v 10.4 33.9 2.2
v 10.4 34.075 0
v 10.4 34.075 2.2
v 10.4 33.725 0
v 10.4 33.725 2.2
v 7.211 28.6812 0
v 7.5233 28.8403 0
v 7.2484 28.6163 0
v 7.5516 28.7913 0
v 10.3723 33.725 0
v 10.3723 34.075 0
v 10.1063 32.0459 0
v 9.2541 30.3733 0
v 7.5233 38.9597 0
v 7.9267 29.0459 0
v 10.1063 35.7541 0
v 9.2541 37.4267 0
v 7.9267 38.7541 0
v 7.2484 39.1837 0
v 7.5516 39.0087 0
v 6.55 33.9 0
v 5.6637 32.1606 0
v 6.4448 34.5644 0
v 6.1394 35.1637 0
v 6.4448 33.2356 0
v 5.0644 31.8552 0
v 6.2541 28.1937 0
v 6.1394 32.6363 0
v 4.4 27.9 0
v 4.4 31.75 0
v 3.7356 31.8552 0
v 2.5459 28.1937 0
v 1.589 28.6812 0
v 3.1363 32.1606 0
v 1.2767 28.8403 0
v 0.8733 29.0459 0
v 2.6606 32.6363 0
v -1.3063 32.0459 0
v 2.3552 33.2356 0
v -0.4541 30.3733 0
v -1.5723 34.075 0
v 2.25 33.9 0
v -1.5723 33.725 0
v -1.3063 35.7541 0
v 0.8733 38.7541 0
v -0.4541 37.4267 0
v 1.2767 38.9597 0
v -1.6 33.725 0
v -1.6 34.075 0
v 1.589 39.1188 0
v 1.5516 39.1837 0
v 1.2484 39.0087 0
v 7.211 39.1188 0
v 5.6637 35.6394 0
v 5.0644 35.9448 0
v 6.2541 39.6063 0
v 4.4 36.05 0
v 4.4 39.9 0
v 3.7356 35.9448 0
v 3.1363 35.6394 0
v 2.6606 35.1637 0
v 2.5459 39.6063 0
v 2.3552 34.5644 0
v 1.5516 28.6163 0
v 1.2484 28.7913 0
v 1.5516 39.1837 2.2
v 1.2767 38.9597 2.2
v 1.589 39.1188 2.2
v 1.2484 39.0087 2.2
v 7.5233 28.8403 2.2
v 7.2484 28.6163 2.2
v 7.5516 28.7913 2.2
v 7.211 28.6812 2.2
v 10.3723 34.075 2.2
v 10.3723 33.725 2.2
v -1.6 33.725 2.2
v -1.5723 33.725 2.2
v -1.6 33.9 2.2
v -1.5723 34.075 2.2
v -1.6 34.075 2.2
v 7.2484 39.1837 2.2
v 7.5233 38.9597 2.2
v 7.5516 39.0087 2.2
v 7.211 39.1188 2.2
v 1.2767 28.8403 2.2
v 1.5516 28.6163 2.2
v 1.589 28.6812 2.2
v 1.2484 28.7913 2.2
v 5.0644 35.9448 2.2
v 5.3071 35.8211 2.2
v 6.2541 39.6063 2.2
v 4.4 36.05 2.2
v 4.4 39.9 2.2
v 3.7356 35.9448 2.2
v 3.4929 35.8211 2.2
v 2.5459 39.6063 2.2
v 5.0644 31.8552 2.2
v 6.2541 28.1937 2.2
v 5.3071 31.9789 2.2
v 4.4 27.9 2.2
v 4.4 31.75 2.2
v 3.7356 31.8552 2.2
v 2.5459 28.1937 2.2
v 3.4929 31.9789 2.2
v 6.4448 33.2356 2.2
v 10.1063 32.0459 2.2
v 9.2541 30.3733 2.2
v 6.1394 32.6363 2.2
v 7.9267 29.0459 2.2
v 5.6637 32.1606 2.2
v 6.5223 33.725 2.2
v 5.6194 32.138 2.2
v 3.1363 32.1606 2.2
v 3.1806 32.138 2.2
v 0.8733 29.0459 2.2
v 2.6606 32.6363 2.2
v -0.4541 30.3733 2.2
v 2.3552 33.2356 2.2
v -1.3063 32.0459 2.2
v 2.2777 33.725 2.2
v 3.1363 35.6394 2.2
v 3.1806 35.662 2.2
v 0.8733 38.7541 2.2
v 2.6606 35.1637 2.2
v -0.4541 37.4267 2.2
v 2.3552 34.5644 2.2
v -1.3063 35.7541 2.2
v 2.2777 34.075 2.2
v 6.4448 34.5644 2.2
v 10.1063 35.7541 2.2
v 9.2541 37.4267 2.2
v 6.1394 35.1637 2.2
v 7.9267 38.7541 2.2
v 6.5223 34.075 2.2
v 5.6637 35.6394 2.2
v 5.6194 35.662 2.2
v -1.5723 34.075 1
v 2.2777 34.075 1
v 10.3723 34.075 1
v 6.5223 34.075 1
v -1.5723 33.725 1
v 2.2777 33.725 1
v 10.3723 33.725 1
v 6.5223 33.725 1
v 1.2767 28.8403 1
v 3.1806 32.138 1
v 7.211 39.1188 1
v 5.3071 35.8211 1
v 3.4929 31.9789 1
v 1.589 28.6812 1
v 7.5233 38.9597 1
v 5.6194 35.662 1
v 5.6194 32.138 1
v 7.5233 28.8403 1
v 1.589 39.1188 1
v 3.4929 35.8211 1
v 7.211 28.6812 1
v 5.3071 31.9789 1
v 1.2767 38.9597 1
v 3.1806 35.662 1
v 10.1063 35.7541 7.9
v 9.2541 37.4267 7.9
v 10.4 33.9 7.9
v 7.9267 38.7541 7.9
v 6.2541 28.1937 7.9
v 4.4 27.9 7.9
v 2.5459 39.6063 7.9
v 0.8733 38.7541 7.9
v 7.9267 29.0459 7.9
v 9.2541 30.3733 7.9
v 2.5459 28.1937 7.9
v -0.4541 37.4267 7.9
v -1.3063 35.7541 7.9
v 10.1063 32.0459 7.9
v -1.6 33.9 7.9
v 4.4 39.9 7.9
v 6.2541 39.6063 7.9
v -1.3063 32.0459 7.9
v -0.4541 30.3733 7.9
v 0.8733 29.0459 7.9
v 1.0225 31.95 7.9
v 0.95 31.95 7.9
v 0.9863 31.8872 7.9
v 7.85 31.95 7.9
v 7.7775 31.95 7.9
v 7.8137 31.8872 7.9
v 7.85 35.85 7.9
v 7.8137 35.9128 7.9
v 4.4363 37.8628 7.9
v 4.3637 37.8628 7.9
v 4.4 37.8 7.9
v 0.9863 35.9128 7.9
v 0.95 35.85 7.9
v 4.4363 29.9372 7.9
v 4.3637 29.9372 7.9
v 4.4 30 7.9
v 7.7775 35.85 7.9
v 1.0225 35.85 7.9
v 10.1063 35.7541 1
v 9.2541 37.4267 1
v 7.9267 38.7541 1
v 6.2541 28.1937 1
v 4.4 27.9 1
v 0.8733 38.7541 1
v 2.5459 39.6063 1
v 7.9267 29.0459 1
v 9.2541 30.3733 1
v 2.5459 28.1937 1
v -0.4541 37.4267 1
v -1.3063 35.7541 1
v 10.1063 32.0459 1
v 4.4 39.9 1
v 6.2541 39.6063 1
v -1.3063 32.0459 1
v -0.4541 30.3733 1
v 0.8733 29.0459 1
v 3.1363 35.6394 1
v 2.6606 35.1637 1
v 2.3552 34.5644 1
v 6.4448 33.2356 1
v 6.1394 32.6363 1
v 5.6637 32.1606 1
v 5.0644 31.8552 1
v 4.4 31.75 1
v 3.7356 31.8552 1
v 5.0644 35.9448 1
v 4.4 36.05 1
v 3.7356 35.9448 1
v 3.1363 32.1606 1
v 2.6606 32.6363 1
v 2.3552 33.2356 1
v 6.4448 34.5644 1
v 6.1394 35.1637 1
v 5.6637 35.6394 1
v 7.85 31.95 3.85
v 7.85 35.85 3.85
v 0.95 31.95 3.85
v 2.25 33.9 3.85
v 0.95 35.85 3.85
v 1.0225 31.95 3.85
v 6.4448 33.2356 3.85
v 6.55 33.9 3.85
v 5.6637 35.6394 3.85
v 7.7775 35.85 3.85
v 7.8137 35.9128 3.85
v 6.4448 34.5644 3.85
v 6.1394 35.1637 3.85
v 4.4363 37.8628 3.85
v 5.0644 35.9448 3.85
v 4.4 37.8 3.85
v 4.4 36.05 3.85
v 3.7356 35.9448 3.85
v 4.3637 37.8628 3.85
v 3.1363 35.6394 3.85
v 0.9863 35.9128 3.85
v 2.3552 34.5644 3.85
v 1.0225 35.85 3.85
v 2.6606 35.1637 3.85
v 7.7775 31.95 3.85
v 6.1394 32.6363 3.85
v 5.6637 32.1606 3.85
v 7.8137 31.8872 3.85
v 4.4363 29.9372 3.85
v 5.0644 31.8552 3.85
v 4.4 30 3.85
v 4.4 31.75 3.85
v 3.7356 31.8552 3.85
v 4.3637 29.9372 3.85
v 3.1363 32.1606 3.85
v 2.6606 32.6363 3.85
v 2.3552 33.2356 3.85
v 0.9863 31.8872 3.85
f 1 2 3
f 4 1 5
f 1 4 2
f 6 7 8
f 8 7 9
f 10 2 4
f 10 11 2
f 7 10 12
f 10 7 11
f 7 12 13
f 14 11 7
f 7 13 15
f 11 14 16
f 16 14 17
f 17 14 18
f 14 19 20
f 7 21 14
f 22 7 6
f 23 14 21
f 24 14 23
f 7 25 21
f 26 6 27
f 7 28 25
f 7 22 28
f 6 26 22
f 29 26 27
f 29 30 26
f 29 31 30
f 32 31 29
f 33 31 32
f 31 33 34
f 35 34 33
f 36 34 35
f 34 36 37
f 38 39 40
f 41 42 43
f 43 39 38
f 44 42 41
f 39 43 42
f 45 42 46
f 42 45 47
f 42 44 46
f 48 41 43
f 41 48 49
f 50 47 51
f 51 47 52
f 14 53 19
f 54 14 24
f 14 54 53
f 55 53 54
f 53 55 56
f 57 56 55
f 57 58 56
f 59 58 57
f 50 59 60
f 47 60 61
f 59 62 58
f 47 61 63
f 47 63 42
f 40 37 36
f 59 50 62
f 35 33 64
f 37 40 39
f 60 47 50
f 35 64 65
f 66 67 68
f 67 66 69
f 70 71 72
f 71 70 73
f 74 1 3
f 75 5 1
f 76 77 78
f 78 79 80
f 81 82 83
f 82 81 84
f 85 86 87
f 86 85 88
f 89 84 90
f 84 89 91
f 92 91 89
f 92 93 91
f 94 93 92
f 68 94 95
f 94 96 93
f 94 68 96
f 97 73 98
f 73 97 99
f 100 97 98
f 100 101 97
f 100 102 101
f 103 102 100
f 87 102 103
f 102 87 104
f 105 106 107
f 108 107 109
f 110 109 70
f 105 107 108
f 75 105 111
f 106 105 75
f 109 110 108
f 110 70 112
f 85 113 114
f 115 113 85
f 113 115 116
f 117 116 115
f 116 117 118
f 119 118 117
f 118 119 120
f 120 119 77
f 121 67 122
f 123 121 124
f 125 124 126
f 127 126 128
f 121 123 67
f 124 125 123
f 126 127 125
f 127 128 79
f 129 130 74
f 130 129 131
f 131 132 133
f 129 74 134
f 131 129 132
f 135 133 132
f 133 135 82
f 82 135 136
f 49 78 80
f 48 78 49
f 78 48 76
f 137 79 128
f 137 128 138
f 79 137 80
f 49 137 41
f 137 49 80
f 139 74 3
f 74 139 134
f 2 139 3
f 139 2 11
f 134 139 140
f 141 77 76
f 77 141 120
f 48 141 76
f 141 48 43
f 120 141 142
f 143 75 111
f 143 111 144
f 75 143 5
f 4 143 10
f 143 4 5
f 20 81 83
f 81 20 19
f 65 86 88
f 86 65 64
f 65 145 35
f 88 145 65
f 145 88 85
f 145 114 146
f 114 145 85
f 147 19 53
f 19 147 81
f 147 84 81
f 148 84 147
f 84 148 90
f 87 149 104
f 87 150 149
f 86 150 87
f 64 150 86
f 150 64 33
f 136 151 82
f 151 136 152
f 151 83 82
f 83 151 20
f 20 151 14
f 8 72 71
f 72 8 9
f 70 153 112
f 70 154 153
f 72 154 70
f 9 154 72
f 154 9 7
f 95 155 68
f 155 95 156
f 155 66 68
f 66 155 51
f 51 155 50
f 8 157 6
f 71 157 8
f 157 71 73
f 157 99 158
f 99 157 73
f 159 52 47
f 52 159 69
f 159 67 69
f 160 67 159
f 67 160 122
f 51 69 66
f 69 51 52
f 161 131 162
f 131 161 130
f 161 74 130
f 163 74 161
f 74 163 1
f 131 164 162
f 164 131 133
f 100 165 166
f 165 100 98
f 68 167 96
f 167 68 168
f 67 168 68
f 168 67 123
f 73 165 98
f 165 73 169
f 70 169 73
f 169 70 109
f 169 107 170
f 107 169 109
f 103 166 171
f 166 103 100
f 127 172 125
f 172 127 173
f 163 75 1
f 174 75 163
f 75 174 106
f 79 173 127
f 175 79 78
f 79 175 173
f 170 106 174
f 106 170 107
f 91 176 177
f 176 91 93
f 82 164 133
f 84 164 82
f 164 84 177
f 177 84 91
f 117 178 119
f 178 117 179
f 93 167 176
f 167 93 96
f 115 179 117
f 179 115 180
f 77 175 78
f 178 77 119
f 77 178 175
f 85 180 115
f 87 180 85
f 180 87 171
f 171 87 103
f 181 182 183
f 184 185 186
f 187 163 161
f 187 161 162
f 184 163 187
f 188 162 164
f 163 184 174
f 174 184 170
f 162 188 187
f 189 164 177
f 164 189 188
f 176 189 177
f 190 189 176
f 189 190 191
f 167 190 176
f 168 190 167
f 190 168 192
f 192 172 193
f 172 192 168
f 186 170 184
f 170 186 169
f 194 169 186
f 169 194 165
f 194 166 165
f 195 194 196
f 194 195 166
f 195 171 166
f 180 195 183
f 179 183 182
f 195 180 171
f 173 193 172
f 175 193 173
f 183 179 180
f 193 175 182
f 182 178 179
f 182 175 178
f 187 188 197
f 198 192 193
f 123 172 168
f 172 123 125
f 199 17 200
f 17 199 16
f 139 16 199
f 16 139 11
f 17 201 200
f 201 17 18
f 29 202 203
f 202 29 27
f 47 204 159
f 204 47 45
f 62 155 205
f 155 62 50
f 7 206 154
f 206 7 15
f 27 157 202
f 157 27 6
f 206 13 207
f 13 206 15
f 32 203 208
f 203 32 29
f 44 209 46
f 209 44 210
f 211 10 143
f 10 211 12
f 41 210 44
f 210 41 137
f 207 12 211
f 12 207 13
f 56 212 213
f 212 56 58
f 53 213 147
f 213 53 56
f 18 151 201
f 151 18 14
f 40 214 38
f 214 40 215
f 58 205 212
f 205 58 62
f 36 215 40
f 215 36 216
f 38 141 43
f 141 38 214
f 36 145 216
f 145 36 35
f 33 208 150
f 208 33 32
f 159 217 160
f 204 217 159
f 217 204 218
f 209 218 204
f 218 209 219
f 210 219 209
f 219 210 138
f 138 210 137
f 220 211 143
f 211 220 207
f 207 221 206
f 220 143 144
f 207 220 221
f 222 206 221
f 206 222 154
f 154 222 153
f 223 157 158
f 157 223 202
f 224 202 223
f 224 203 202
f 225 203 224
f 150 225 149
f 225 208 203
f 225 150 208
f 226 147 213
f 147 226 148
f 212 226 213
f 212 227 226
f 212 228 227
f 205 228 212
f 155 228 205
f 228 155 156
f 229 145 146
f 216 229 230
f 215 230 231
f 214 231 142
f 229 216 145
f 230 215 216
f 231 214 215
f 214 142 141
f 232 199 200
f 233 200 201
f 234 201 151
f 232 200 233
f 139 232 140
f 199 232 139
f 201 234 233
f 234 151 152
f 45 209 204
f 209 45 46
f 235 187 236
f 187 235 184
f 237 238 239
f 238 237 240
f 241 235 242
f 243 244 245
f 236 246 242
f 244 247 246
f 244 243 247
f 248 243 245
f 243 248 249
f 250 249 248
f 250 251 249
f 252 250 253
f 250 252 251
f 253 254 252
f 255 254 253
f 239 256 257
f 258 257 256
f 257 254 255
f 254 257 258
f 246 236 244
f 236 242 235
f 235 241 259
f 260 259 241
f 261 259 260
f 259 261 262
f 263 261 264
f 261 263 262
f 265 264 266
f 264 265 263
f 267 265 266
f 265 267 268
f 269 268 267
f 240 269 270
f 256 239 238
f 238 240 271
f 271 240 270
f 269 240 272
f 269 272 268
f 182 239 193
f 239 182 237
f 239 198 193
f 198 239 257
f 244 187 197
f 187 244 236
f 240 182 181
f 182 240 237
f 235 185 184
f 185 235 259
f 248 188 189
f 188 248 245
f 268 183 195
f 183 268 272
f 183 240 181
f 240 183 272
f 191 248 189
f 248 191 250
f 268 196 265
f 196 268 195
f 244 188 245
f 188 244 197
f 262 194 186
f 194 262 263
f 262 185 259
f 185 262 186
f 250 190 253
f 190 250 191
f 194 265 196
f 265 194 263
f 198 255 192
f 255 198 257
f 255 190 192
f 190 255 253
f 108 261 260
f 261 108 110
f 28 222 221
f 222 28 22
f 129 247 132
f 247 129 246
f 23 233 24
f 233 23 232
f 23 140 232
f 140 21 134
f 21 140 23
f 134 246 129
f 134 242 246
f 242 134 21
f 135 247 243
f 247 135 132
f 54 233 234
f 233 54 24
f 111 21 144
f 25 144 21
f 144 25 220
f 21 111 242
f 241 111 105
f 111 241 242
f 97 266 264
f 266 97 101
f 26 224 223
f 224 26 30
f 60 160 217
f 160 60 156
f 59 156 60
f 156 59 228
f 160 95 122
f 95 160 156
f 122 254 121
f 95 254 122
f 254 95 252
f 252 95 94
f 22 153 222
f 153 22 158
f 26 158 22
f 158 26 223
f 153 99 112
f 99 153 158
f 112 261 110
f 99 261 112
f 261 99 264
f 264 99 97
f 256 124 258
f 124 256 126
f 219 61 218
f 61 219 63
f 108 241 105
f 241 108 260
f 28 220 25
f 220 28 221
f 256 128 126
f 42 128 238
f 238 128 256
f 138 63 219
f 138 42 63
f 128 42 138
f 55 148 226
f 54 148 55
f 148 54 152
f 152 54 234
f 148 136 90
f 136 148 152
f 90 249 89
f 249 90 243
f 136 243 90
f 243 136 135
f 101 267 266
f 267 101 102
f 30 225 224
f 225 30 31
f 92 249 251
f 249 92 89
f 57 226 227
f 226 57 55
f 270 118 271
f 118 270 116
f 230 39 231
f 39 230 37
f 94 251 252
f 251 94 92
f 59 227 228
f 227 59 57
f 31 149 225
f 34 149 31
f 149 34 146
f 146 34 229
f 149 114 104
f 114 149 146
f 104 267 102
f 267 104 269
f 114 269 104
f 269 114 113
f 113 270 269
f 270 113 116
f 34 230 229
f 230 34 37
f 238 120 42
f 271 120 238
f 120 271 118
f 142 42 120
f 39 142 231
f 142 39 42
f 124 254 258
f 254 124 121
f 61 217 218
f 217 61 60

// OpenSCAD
$fn = 20;

module axis() {

	difference() {
		union() {
			cylinder(r = 6, h = 5.7);

			for(i = [0 : 2]) {
				translate([0, 0, 5.7 + 1.1])
				rotate([0, 0, i * 60])
				cube([12, 0.35, 2.2], center = true);
			}

			translate([0, 0, 5.7 + 1.2])
			cylinder(r = 6, h = 1);
		}

		translate([0, 0, -1])
		cylinder(r = 4.3 / 2, h = 12);

		for(i = [0 : 2]) {
			translate([0, 0, 2])
			rotate([0, 0, 60 * i])
			cube([6.9, 3.9, 4.1], center = true);
		}
	}
}

module frame() {

	//cube([40, 30, 5.7]);

	difference() {
		union() {
			cube([40, 6, 5.7]);

			rotate([0, 0, 90])
			translate([0, -6, 0])
			cube([30, 6, 5.7]);

			translate([0, 27, 0])
			rotate([0, 0, -30])
			cube([46, 6, 5.7]);
		}

		translate([40.7, -5, -1])
		cube([20, 20, 10]);

		translate([43, 5, 0])
		cylinder(r = 6, h = 10);

		translate([43, 5, 3.5])
		cylinder(r = 6.5, h = 10);

		translate([-5, 30, -1])
		cube([20, 20, 10]);
	}
}

module base() {
	
	translate([0, 0, 4])
	cube([3, 30, 14]);

//	cylinder(

	translate([3, 0, 0])
	cube([4, 30, 22]);
}

module insert() {
	// # translate([3.5 - 6, 11, 0]) cube([20, 4, 5]);

	difference() {
		cube([13, 11, 5.7]);

		translate([-10, 0, -1])
		rotate([0, 0, -16])
		cube([10, 20, 7]);

		translate([13, 0, -1])
		rotate([0, 0, 3.5])
		cube([10, 20, 7]);
	}
}

module fix() {

	rotate([0, 0, -90])
	translate([-17.5, 13.1, 0])
	insert();

	difference() {
		frame();

		translate([-1, -1, -1])
		cube([25.1, 40, 10]);
	}

	translate([24.1, 0, 0])
	cube([5, 15, 5.7]);

	translate([25, 0, 0])
	cube([11.4, 12, 5.7]);

	translate([43, 5, -2.2])
	axis();

}

//mirror([0, 0, 1])
//fix();

difference() {
	linear_extrude(height = 5.7)
	import("model_print.dxf");

	translate([4.4, 33.9, 2.2 - 5.7])
	cylinder(r = 7.5, h = 5.7);
}

translate([4.4, 33.9, 5.7])
translate([0, 0, 2.2])
mirror([0, 0, 1])
axis();
